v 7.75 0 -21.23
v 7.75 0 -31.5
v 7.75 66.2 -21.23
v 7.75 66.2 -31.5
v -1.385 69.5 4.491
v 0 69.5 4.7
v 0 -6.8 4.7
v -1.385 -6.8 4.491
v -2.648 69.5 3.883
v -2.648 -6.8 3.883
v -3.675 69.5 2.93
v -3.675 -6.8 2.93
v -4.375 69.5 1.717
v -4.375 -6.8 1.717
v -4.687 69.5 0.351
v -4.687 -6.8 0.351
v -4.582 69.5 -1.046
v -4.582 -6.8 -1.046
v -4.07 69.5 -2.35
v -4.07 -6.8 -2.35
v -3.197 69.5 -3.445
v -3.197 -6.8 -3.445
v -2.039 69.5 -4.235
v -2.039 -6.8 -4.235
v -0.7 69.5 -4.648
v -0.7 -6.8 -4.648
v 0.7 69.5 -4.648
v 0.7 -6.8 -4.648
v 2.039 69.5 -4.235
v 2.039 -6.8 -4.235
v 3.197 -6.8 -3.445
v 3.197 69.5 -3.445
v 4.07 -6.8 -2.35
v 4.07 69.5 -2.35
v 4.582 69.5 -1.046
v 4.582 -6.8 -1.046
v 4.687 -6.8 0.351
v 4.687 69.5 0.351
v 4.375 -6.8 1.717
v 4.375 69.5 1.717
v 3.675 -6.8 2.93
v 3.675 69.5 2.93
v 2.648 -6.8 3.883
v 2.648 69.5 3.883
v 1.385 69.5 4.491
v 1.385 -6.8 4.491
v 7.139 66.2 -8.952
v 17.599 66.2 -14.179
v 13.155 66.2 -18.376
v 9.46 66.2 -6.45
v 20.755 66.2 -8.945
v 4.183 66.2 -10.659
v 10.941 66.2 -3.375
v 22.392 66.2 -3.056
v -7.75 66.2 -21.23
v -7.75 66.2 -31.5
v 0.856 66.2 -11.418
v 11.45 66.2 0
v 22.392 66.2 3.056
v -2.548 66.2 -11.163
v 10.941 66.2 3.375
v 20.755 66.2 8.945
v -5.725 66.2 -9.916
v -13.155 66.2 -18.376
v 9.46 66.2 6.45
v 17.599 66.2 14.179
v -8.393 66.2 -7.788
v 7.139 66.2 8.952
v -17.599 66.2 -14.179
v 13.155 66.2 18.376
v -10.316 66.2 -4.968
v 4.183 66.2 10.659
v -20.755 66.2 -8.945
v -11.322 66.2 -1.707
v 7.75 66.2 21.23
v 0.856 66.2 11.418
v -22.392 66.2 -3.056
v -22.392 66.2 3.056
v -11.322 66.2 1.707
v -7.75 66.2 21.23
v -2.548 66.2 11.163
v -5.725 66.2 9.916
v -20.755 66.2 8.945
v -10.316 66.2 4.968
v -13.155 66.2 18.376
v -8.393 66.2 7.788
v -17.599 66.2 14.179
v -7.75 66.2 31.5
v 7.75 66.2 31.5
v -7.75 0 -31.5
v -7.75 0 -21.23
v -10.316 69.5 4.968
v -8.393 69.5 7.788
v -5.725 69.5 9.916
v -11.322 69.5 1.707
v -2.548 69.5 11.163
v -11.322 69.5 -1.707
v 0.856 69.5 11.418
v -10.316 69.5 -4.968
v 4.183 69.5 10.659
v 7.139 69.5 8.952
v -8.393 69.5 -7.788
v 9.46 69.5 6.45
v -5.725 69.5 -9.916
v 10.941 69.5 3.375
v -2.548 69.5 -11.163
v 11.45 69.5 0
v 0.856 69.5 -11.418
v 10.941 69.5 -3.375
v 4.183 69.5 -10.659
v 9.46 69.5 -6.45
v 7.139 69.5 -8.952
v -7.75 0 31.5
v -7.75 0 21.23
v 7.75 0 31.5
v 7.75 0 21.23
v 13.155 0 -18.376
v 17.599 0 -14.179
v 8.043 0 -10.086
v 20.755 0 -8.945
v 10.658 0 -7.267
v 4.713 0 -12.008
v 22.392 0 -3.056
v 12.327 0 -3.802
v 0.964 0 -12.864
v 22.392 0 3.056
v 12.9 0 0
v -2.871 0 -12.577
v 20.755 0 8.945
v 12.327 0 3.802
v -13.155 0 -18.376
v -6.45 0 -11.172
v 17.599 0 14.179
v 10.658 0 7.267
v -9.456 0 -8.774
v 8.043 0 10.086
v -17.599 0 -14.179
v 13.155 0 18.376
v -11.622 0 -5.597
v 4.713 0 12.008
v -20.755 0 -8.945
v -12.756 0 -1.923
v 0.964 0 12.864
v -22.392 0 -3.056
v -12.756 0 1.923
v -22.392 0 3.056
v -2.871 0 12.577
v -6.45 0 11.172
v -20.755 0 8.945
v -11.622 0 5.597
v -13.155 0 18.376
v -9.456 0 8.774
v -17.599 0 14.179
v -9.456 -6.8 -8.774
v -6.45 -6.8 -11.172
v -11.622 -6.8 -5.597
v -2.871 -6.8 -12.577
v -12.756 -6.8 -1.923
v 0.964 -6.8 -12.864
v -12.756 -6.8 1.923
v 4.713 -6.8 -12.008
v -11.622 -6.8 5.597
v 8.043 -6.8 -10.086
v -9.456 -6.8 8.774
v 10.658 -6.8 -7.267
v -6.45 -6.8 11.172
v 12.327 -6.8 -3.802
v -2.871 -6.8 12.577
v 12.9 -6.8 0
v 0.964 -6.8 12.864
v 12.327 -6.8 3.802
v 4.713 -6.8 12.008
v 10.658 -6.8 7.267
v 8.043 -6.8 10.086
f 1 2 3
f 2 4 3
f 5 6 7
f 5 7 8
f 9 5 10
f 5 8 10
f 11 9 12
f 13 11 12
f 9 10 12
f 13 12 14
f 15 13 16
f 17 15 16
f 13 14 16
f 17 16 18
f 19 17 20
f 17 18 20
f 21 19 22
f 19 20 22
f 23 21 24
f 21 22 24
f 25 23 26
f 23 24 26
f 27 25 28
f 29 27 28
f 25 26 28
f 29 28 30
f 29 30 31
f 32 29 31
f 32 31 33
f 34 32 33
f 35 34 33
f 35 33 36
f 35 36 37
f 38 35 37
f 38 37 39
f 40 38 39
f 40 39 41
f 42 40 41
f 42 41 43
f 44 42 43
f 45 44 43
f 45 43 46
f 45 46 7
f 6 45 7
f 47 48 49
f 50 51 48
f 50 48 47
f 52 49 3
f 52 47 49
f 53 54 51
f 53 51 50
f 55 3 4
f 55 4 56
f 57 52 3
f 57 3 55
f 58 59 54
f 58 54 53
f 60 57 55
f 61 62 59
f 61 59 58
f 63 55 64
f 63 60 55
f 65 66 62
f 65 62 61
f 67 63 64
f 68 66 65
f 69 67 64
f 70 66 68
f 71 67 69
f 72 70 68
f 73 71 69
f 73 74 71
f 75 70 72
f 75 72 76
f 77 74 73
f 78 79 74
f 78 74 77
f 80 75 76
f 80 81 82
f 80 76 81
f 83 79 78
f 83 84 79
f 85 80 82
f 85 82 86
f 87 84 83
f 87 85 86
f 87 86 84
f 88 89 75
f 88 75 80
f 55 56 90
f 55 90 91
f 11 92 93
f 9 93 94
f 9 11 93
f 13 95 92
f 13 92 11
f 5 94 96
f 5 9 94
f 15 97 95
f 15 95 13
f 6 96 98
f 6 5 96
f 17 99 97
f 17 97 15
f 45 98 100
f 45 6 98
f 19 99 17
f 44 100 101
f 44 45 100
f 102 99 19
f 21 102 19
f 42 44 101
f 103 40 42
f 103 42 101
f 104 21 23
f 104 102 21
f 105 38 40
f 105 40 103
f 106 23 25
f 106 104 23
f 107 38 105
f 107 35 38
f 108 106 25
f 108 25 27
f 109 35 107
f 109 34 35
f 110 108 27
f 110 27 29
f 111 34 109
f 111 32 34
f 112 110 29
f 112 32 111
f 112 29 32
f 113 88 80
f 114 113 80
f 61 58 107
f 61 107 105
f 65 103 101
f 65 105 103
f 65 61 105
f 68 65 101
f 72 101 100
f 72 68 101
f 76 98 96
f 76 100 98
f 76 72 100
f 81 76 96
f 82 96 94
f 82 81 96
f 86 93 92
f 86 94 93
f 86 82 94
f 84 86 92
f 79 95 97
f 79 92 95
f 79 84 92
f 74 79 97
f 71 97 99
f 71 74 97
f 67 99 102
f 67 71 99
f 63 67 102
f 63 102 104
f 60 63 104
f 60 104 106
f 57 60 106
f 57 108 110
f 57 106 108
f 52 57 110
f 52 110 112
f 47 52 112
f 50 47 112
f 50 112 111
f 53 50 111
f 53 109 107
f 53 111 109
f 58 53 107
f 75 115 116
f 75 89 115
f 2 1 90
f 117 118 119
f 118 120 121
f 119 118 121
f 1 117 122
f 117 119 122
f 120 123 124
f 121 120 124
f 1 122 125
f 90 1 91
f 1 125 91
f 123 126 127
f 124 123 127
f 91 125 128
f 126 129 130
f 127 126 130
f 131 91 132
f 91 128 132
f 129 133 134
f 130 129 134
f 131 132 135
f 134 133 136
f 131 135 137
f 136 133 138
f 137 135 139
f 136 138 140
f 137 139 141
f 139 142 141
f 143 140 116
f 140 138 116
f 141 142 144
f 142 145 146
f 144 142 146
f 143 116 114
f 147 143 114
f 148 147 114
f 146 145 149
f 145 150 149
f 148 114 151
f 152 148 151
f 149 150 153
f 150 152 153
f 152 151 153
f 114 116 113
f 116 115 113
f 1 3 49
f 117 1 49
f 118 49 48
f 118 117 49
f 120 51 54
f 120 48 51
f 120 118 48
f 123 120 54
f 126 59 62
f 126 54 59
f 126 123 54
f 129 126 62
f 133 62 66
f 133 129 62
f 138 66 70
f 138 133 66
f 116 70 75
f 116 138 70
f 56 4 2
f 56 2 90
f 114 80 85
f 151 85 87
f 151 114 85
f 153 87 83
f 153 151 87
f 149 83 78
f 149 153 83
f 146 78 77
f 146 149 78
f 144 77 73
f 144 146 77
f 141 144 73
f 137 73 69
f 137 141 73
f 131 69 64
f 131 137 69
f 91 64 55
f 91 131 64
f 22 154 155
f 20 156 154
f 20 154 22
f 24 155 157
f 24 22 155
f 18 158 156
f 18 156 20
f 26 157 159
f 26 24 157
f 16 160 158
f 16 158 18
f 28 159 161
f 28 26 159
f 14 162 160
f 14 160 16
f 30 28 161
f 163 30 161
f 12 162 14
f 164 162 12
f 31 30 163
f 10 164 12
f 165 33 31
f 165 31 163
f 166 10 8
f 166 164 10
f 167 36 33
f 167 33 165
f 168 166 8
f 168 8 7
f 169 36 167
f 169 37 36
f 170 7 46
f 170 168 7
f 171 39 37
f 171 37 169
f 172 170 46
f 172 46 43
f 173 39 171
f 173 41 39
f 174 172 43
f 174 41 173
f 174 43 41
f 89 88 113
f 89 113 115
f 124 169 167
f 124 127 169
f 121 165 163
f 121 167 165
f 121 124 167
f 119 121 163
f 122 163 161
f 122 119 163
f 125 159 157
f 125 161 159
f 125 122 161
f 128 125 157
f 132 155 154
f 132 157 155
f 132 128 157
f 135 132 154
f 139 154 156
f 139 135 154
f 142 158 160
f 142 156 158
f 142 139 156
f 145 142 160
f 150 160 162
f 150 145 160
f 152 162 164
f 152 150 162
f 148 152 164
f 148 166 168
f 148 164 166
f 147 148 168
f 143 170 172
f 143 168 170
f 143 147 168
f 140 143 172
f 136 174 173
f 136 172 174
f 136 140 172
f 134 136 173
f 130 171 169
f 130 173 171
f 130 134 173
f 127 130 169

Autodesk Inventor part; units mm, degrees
ref_plane "YZ Plane" through (0, 0, 0) normal (1, 0, 0) x (0, 1, 0)
ref_plane "XZ Plane" through (0, 0, 0) normal (0, 1, 0) x (-1, 0, 0)
ref_plane "XY Plane" through (0, 0, 0) normal (0, 0, 1) x (1, 0, 0)
sketch "Sketch1" plane through (0, 0, 0) normal (0, 1, 0) x (-1, 0, 0)
  circle A0 centre (0, 0) radius 22.6
  dimension "d0" = 45.2
extrude "Extrusion1" add sketch "Sketch1" along normal blind 66.2
sketch "Sketch2" plane through (0, 66.2, 0) normal (0, 1, 0) x (1, 0, 0)
  circle A0 centre (0, 0) radius 11.45
  dimension "d3" = 22.9
extrude "Extrusion2" add sketch "Sketch2" along normal blind 3.3
sketch "Sketch4" plane through (0, 0, 0) normal (0, -1, 0) x (1, 0, 0)
  circle A0 centre (0, 0) radius 12.9
  dimension "d14" = 25.8
extrude "Extrusion3" add sketch "Sketch4" along normal blind 6.8
sketch "Sketch5" plane through (0, 69.5, 0) normal (0, 1, 0) x (1, 0, 0)
  point P0 (0, 0)
hole "Hole2" at (0, 69.5, 0) direction (0, -1, 0) diameter 9.4 depth 92.25 tip angle 118
sketch "Sketch6" plane through (0, 66.2, 0) normal (0, 1, 0) x (1, 0, 0)
  circle A0 centre (0, 0) radius 4.7 projected
  circle A1 centre (0, 0) radius 22.6 projected
  line L0 (0, 31.5) -> (7.75, 31.5)
  line L1 (0, 31.5) -> (-7.75, 31.5)
  line L2 (-7.75, 31.5) -> (-7.75, 21.2296)
  line L3 (7.75, 31.5) -> (7.75, 21.2296)
  line L4 (0, -31.5) -> (7.75, -31.5)
  line L5 (0, -31.5) -> (-7.75, -31.5)
  line L6 (-7.75, -31.5) -> (-7.75, -21.2296)
  line L7 (7.75, -31.5) -> (7.75, -21.2296)
  dimension "d25" = 7.75
  dimension "d26" = 7.75
sketch "Sketch7" plane through (0, 66.2, 0) normal (0, 1, 0) x (1, 0, 0)
  point P0 (0, 0)
extrude "Extrusion4" add sketch "Sketch6" against normal blind 66.2 contours A1 L2 L1 L0 L3 | L7 L4 L5 L6 A1
equation "\"d27\" = d1"
equation "\"d1\" = 66.2"
properties part number "Dc Gen Outline"
